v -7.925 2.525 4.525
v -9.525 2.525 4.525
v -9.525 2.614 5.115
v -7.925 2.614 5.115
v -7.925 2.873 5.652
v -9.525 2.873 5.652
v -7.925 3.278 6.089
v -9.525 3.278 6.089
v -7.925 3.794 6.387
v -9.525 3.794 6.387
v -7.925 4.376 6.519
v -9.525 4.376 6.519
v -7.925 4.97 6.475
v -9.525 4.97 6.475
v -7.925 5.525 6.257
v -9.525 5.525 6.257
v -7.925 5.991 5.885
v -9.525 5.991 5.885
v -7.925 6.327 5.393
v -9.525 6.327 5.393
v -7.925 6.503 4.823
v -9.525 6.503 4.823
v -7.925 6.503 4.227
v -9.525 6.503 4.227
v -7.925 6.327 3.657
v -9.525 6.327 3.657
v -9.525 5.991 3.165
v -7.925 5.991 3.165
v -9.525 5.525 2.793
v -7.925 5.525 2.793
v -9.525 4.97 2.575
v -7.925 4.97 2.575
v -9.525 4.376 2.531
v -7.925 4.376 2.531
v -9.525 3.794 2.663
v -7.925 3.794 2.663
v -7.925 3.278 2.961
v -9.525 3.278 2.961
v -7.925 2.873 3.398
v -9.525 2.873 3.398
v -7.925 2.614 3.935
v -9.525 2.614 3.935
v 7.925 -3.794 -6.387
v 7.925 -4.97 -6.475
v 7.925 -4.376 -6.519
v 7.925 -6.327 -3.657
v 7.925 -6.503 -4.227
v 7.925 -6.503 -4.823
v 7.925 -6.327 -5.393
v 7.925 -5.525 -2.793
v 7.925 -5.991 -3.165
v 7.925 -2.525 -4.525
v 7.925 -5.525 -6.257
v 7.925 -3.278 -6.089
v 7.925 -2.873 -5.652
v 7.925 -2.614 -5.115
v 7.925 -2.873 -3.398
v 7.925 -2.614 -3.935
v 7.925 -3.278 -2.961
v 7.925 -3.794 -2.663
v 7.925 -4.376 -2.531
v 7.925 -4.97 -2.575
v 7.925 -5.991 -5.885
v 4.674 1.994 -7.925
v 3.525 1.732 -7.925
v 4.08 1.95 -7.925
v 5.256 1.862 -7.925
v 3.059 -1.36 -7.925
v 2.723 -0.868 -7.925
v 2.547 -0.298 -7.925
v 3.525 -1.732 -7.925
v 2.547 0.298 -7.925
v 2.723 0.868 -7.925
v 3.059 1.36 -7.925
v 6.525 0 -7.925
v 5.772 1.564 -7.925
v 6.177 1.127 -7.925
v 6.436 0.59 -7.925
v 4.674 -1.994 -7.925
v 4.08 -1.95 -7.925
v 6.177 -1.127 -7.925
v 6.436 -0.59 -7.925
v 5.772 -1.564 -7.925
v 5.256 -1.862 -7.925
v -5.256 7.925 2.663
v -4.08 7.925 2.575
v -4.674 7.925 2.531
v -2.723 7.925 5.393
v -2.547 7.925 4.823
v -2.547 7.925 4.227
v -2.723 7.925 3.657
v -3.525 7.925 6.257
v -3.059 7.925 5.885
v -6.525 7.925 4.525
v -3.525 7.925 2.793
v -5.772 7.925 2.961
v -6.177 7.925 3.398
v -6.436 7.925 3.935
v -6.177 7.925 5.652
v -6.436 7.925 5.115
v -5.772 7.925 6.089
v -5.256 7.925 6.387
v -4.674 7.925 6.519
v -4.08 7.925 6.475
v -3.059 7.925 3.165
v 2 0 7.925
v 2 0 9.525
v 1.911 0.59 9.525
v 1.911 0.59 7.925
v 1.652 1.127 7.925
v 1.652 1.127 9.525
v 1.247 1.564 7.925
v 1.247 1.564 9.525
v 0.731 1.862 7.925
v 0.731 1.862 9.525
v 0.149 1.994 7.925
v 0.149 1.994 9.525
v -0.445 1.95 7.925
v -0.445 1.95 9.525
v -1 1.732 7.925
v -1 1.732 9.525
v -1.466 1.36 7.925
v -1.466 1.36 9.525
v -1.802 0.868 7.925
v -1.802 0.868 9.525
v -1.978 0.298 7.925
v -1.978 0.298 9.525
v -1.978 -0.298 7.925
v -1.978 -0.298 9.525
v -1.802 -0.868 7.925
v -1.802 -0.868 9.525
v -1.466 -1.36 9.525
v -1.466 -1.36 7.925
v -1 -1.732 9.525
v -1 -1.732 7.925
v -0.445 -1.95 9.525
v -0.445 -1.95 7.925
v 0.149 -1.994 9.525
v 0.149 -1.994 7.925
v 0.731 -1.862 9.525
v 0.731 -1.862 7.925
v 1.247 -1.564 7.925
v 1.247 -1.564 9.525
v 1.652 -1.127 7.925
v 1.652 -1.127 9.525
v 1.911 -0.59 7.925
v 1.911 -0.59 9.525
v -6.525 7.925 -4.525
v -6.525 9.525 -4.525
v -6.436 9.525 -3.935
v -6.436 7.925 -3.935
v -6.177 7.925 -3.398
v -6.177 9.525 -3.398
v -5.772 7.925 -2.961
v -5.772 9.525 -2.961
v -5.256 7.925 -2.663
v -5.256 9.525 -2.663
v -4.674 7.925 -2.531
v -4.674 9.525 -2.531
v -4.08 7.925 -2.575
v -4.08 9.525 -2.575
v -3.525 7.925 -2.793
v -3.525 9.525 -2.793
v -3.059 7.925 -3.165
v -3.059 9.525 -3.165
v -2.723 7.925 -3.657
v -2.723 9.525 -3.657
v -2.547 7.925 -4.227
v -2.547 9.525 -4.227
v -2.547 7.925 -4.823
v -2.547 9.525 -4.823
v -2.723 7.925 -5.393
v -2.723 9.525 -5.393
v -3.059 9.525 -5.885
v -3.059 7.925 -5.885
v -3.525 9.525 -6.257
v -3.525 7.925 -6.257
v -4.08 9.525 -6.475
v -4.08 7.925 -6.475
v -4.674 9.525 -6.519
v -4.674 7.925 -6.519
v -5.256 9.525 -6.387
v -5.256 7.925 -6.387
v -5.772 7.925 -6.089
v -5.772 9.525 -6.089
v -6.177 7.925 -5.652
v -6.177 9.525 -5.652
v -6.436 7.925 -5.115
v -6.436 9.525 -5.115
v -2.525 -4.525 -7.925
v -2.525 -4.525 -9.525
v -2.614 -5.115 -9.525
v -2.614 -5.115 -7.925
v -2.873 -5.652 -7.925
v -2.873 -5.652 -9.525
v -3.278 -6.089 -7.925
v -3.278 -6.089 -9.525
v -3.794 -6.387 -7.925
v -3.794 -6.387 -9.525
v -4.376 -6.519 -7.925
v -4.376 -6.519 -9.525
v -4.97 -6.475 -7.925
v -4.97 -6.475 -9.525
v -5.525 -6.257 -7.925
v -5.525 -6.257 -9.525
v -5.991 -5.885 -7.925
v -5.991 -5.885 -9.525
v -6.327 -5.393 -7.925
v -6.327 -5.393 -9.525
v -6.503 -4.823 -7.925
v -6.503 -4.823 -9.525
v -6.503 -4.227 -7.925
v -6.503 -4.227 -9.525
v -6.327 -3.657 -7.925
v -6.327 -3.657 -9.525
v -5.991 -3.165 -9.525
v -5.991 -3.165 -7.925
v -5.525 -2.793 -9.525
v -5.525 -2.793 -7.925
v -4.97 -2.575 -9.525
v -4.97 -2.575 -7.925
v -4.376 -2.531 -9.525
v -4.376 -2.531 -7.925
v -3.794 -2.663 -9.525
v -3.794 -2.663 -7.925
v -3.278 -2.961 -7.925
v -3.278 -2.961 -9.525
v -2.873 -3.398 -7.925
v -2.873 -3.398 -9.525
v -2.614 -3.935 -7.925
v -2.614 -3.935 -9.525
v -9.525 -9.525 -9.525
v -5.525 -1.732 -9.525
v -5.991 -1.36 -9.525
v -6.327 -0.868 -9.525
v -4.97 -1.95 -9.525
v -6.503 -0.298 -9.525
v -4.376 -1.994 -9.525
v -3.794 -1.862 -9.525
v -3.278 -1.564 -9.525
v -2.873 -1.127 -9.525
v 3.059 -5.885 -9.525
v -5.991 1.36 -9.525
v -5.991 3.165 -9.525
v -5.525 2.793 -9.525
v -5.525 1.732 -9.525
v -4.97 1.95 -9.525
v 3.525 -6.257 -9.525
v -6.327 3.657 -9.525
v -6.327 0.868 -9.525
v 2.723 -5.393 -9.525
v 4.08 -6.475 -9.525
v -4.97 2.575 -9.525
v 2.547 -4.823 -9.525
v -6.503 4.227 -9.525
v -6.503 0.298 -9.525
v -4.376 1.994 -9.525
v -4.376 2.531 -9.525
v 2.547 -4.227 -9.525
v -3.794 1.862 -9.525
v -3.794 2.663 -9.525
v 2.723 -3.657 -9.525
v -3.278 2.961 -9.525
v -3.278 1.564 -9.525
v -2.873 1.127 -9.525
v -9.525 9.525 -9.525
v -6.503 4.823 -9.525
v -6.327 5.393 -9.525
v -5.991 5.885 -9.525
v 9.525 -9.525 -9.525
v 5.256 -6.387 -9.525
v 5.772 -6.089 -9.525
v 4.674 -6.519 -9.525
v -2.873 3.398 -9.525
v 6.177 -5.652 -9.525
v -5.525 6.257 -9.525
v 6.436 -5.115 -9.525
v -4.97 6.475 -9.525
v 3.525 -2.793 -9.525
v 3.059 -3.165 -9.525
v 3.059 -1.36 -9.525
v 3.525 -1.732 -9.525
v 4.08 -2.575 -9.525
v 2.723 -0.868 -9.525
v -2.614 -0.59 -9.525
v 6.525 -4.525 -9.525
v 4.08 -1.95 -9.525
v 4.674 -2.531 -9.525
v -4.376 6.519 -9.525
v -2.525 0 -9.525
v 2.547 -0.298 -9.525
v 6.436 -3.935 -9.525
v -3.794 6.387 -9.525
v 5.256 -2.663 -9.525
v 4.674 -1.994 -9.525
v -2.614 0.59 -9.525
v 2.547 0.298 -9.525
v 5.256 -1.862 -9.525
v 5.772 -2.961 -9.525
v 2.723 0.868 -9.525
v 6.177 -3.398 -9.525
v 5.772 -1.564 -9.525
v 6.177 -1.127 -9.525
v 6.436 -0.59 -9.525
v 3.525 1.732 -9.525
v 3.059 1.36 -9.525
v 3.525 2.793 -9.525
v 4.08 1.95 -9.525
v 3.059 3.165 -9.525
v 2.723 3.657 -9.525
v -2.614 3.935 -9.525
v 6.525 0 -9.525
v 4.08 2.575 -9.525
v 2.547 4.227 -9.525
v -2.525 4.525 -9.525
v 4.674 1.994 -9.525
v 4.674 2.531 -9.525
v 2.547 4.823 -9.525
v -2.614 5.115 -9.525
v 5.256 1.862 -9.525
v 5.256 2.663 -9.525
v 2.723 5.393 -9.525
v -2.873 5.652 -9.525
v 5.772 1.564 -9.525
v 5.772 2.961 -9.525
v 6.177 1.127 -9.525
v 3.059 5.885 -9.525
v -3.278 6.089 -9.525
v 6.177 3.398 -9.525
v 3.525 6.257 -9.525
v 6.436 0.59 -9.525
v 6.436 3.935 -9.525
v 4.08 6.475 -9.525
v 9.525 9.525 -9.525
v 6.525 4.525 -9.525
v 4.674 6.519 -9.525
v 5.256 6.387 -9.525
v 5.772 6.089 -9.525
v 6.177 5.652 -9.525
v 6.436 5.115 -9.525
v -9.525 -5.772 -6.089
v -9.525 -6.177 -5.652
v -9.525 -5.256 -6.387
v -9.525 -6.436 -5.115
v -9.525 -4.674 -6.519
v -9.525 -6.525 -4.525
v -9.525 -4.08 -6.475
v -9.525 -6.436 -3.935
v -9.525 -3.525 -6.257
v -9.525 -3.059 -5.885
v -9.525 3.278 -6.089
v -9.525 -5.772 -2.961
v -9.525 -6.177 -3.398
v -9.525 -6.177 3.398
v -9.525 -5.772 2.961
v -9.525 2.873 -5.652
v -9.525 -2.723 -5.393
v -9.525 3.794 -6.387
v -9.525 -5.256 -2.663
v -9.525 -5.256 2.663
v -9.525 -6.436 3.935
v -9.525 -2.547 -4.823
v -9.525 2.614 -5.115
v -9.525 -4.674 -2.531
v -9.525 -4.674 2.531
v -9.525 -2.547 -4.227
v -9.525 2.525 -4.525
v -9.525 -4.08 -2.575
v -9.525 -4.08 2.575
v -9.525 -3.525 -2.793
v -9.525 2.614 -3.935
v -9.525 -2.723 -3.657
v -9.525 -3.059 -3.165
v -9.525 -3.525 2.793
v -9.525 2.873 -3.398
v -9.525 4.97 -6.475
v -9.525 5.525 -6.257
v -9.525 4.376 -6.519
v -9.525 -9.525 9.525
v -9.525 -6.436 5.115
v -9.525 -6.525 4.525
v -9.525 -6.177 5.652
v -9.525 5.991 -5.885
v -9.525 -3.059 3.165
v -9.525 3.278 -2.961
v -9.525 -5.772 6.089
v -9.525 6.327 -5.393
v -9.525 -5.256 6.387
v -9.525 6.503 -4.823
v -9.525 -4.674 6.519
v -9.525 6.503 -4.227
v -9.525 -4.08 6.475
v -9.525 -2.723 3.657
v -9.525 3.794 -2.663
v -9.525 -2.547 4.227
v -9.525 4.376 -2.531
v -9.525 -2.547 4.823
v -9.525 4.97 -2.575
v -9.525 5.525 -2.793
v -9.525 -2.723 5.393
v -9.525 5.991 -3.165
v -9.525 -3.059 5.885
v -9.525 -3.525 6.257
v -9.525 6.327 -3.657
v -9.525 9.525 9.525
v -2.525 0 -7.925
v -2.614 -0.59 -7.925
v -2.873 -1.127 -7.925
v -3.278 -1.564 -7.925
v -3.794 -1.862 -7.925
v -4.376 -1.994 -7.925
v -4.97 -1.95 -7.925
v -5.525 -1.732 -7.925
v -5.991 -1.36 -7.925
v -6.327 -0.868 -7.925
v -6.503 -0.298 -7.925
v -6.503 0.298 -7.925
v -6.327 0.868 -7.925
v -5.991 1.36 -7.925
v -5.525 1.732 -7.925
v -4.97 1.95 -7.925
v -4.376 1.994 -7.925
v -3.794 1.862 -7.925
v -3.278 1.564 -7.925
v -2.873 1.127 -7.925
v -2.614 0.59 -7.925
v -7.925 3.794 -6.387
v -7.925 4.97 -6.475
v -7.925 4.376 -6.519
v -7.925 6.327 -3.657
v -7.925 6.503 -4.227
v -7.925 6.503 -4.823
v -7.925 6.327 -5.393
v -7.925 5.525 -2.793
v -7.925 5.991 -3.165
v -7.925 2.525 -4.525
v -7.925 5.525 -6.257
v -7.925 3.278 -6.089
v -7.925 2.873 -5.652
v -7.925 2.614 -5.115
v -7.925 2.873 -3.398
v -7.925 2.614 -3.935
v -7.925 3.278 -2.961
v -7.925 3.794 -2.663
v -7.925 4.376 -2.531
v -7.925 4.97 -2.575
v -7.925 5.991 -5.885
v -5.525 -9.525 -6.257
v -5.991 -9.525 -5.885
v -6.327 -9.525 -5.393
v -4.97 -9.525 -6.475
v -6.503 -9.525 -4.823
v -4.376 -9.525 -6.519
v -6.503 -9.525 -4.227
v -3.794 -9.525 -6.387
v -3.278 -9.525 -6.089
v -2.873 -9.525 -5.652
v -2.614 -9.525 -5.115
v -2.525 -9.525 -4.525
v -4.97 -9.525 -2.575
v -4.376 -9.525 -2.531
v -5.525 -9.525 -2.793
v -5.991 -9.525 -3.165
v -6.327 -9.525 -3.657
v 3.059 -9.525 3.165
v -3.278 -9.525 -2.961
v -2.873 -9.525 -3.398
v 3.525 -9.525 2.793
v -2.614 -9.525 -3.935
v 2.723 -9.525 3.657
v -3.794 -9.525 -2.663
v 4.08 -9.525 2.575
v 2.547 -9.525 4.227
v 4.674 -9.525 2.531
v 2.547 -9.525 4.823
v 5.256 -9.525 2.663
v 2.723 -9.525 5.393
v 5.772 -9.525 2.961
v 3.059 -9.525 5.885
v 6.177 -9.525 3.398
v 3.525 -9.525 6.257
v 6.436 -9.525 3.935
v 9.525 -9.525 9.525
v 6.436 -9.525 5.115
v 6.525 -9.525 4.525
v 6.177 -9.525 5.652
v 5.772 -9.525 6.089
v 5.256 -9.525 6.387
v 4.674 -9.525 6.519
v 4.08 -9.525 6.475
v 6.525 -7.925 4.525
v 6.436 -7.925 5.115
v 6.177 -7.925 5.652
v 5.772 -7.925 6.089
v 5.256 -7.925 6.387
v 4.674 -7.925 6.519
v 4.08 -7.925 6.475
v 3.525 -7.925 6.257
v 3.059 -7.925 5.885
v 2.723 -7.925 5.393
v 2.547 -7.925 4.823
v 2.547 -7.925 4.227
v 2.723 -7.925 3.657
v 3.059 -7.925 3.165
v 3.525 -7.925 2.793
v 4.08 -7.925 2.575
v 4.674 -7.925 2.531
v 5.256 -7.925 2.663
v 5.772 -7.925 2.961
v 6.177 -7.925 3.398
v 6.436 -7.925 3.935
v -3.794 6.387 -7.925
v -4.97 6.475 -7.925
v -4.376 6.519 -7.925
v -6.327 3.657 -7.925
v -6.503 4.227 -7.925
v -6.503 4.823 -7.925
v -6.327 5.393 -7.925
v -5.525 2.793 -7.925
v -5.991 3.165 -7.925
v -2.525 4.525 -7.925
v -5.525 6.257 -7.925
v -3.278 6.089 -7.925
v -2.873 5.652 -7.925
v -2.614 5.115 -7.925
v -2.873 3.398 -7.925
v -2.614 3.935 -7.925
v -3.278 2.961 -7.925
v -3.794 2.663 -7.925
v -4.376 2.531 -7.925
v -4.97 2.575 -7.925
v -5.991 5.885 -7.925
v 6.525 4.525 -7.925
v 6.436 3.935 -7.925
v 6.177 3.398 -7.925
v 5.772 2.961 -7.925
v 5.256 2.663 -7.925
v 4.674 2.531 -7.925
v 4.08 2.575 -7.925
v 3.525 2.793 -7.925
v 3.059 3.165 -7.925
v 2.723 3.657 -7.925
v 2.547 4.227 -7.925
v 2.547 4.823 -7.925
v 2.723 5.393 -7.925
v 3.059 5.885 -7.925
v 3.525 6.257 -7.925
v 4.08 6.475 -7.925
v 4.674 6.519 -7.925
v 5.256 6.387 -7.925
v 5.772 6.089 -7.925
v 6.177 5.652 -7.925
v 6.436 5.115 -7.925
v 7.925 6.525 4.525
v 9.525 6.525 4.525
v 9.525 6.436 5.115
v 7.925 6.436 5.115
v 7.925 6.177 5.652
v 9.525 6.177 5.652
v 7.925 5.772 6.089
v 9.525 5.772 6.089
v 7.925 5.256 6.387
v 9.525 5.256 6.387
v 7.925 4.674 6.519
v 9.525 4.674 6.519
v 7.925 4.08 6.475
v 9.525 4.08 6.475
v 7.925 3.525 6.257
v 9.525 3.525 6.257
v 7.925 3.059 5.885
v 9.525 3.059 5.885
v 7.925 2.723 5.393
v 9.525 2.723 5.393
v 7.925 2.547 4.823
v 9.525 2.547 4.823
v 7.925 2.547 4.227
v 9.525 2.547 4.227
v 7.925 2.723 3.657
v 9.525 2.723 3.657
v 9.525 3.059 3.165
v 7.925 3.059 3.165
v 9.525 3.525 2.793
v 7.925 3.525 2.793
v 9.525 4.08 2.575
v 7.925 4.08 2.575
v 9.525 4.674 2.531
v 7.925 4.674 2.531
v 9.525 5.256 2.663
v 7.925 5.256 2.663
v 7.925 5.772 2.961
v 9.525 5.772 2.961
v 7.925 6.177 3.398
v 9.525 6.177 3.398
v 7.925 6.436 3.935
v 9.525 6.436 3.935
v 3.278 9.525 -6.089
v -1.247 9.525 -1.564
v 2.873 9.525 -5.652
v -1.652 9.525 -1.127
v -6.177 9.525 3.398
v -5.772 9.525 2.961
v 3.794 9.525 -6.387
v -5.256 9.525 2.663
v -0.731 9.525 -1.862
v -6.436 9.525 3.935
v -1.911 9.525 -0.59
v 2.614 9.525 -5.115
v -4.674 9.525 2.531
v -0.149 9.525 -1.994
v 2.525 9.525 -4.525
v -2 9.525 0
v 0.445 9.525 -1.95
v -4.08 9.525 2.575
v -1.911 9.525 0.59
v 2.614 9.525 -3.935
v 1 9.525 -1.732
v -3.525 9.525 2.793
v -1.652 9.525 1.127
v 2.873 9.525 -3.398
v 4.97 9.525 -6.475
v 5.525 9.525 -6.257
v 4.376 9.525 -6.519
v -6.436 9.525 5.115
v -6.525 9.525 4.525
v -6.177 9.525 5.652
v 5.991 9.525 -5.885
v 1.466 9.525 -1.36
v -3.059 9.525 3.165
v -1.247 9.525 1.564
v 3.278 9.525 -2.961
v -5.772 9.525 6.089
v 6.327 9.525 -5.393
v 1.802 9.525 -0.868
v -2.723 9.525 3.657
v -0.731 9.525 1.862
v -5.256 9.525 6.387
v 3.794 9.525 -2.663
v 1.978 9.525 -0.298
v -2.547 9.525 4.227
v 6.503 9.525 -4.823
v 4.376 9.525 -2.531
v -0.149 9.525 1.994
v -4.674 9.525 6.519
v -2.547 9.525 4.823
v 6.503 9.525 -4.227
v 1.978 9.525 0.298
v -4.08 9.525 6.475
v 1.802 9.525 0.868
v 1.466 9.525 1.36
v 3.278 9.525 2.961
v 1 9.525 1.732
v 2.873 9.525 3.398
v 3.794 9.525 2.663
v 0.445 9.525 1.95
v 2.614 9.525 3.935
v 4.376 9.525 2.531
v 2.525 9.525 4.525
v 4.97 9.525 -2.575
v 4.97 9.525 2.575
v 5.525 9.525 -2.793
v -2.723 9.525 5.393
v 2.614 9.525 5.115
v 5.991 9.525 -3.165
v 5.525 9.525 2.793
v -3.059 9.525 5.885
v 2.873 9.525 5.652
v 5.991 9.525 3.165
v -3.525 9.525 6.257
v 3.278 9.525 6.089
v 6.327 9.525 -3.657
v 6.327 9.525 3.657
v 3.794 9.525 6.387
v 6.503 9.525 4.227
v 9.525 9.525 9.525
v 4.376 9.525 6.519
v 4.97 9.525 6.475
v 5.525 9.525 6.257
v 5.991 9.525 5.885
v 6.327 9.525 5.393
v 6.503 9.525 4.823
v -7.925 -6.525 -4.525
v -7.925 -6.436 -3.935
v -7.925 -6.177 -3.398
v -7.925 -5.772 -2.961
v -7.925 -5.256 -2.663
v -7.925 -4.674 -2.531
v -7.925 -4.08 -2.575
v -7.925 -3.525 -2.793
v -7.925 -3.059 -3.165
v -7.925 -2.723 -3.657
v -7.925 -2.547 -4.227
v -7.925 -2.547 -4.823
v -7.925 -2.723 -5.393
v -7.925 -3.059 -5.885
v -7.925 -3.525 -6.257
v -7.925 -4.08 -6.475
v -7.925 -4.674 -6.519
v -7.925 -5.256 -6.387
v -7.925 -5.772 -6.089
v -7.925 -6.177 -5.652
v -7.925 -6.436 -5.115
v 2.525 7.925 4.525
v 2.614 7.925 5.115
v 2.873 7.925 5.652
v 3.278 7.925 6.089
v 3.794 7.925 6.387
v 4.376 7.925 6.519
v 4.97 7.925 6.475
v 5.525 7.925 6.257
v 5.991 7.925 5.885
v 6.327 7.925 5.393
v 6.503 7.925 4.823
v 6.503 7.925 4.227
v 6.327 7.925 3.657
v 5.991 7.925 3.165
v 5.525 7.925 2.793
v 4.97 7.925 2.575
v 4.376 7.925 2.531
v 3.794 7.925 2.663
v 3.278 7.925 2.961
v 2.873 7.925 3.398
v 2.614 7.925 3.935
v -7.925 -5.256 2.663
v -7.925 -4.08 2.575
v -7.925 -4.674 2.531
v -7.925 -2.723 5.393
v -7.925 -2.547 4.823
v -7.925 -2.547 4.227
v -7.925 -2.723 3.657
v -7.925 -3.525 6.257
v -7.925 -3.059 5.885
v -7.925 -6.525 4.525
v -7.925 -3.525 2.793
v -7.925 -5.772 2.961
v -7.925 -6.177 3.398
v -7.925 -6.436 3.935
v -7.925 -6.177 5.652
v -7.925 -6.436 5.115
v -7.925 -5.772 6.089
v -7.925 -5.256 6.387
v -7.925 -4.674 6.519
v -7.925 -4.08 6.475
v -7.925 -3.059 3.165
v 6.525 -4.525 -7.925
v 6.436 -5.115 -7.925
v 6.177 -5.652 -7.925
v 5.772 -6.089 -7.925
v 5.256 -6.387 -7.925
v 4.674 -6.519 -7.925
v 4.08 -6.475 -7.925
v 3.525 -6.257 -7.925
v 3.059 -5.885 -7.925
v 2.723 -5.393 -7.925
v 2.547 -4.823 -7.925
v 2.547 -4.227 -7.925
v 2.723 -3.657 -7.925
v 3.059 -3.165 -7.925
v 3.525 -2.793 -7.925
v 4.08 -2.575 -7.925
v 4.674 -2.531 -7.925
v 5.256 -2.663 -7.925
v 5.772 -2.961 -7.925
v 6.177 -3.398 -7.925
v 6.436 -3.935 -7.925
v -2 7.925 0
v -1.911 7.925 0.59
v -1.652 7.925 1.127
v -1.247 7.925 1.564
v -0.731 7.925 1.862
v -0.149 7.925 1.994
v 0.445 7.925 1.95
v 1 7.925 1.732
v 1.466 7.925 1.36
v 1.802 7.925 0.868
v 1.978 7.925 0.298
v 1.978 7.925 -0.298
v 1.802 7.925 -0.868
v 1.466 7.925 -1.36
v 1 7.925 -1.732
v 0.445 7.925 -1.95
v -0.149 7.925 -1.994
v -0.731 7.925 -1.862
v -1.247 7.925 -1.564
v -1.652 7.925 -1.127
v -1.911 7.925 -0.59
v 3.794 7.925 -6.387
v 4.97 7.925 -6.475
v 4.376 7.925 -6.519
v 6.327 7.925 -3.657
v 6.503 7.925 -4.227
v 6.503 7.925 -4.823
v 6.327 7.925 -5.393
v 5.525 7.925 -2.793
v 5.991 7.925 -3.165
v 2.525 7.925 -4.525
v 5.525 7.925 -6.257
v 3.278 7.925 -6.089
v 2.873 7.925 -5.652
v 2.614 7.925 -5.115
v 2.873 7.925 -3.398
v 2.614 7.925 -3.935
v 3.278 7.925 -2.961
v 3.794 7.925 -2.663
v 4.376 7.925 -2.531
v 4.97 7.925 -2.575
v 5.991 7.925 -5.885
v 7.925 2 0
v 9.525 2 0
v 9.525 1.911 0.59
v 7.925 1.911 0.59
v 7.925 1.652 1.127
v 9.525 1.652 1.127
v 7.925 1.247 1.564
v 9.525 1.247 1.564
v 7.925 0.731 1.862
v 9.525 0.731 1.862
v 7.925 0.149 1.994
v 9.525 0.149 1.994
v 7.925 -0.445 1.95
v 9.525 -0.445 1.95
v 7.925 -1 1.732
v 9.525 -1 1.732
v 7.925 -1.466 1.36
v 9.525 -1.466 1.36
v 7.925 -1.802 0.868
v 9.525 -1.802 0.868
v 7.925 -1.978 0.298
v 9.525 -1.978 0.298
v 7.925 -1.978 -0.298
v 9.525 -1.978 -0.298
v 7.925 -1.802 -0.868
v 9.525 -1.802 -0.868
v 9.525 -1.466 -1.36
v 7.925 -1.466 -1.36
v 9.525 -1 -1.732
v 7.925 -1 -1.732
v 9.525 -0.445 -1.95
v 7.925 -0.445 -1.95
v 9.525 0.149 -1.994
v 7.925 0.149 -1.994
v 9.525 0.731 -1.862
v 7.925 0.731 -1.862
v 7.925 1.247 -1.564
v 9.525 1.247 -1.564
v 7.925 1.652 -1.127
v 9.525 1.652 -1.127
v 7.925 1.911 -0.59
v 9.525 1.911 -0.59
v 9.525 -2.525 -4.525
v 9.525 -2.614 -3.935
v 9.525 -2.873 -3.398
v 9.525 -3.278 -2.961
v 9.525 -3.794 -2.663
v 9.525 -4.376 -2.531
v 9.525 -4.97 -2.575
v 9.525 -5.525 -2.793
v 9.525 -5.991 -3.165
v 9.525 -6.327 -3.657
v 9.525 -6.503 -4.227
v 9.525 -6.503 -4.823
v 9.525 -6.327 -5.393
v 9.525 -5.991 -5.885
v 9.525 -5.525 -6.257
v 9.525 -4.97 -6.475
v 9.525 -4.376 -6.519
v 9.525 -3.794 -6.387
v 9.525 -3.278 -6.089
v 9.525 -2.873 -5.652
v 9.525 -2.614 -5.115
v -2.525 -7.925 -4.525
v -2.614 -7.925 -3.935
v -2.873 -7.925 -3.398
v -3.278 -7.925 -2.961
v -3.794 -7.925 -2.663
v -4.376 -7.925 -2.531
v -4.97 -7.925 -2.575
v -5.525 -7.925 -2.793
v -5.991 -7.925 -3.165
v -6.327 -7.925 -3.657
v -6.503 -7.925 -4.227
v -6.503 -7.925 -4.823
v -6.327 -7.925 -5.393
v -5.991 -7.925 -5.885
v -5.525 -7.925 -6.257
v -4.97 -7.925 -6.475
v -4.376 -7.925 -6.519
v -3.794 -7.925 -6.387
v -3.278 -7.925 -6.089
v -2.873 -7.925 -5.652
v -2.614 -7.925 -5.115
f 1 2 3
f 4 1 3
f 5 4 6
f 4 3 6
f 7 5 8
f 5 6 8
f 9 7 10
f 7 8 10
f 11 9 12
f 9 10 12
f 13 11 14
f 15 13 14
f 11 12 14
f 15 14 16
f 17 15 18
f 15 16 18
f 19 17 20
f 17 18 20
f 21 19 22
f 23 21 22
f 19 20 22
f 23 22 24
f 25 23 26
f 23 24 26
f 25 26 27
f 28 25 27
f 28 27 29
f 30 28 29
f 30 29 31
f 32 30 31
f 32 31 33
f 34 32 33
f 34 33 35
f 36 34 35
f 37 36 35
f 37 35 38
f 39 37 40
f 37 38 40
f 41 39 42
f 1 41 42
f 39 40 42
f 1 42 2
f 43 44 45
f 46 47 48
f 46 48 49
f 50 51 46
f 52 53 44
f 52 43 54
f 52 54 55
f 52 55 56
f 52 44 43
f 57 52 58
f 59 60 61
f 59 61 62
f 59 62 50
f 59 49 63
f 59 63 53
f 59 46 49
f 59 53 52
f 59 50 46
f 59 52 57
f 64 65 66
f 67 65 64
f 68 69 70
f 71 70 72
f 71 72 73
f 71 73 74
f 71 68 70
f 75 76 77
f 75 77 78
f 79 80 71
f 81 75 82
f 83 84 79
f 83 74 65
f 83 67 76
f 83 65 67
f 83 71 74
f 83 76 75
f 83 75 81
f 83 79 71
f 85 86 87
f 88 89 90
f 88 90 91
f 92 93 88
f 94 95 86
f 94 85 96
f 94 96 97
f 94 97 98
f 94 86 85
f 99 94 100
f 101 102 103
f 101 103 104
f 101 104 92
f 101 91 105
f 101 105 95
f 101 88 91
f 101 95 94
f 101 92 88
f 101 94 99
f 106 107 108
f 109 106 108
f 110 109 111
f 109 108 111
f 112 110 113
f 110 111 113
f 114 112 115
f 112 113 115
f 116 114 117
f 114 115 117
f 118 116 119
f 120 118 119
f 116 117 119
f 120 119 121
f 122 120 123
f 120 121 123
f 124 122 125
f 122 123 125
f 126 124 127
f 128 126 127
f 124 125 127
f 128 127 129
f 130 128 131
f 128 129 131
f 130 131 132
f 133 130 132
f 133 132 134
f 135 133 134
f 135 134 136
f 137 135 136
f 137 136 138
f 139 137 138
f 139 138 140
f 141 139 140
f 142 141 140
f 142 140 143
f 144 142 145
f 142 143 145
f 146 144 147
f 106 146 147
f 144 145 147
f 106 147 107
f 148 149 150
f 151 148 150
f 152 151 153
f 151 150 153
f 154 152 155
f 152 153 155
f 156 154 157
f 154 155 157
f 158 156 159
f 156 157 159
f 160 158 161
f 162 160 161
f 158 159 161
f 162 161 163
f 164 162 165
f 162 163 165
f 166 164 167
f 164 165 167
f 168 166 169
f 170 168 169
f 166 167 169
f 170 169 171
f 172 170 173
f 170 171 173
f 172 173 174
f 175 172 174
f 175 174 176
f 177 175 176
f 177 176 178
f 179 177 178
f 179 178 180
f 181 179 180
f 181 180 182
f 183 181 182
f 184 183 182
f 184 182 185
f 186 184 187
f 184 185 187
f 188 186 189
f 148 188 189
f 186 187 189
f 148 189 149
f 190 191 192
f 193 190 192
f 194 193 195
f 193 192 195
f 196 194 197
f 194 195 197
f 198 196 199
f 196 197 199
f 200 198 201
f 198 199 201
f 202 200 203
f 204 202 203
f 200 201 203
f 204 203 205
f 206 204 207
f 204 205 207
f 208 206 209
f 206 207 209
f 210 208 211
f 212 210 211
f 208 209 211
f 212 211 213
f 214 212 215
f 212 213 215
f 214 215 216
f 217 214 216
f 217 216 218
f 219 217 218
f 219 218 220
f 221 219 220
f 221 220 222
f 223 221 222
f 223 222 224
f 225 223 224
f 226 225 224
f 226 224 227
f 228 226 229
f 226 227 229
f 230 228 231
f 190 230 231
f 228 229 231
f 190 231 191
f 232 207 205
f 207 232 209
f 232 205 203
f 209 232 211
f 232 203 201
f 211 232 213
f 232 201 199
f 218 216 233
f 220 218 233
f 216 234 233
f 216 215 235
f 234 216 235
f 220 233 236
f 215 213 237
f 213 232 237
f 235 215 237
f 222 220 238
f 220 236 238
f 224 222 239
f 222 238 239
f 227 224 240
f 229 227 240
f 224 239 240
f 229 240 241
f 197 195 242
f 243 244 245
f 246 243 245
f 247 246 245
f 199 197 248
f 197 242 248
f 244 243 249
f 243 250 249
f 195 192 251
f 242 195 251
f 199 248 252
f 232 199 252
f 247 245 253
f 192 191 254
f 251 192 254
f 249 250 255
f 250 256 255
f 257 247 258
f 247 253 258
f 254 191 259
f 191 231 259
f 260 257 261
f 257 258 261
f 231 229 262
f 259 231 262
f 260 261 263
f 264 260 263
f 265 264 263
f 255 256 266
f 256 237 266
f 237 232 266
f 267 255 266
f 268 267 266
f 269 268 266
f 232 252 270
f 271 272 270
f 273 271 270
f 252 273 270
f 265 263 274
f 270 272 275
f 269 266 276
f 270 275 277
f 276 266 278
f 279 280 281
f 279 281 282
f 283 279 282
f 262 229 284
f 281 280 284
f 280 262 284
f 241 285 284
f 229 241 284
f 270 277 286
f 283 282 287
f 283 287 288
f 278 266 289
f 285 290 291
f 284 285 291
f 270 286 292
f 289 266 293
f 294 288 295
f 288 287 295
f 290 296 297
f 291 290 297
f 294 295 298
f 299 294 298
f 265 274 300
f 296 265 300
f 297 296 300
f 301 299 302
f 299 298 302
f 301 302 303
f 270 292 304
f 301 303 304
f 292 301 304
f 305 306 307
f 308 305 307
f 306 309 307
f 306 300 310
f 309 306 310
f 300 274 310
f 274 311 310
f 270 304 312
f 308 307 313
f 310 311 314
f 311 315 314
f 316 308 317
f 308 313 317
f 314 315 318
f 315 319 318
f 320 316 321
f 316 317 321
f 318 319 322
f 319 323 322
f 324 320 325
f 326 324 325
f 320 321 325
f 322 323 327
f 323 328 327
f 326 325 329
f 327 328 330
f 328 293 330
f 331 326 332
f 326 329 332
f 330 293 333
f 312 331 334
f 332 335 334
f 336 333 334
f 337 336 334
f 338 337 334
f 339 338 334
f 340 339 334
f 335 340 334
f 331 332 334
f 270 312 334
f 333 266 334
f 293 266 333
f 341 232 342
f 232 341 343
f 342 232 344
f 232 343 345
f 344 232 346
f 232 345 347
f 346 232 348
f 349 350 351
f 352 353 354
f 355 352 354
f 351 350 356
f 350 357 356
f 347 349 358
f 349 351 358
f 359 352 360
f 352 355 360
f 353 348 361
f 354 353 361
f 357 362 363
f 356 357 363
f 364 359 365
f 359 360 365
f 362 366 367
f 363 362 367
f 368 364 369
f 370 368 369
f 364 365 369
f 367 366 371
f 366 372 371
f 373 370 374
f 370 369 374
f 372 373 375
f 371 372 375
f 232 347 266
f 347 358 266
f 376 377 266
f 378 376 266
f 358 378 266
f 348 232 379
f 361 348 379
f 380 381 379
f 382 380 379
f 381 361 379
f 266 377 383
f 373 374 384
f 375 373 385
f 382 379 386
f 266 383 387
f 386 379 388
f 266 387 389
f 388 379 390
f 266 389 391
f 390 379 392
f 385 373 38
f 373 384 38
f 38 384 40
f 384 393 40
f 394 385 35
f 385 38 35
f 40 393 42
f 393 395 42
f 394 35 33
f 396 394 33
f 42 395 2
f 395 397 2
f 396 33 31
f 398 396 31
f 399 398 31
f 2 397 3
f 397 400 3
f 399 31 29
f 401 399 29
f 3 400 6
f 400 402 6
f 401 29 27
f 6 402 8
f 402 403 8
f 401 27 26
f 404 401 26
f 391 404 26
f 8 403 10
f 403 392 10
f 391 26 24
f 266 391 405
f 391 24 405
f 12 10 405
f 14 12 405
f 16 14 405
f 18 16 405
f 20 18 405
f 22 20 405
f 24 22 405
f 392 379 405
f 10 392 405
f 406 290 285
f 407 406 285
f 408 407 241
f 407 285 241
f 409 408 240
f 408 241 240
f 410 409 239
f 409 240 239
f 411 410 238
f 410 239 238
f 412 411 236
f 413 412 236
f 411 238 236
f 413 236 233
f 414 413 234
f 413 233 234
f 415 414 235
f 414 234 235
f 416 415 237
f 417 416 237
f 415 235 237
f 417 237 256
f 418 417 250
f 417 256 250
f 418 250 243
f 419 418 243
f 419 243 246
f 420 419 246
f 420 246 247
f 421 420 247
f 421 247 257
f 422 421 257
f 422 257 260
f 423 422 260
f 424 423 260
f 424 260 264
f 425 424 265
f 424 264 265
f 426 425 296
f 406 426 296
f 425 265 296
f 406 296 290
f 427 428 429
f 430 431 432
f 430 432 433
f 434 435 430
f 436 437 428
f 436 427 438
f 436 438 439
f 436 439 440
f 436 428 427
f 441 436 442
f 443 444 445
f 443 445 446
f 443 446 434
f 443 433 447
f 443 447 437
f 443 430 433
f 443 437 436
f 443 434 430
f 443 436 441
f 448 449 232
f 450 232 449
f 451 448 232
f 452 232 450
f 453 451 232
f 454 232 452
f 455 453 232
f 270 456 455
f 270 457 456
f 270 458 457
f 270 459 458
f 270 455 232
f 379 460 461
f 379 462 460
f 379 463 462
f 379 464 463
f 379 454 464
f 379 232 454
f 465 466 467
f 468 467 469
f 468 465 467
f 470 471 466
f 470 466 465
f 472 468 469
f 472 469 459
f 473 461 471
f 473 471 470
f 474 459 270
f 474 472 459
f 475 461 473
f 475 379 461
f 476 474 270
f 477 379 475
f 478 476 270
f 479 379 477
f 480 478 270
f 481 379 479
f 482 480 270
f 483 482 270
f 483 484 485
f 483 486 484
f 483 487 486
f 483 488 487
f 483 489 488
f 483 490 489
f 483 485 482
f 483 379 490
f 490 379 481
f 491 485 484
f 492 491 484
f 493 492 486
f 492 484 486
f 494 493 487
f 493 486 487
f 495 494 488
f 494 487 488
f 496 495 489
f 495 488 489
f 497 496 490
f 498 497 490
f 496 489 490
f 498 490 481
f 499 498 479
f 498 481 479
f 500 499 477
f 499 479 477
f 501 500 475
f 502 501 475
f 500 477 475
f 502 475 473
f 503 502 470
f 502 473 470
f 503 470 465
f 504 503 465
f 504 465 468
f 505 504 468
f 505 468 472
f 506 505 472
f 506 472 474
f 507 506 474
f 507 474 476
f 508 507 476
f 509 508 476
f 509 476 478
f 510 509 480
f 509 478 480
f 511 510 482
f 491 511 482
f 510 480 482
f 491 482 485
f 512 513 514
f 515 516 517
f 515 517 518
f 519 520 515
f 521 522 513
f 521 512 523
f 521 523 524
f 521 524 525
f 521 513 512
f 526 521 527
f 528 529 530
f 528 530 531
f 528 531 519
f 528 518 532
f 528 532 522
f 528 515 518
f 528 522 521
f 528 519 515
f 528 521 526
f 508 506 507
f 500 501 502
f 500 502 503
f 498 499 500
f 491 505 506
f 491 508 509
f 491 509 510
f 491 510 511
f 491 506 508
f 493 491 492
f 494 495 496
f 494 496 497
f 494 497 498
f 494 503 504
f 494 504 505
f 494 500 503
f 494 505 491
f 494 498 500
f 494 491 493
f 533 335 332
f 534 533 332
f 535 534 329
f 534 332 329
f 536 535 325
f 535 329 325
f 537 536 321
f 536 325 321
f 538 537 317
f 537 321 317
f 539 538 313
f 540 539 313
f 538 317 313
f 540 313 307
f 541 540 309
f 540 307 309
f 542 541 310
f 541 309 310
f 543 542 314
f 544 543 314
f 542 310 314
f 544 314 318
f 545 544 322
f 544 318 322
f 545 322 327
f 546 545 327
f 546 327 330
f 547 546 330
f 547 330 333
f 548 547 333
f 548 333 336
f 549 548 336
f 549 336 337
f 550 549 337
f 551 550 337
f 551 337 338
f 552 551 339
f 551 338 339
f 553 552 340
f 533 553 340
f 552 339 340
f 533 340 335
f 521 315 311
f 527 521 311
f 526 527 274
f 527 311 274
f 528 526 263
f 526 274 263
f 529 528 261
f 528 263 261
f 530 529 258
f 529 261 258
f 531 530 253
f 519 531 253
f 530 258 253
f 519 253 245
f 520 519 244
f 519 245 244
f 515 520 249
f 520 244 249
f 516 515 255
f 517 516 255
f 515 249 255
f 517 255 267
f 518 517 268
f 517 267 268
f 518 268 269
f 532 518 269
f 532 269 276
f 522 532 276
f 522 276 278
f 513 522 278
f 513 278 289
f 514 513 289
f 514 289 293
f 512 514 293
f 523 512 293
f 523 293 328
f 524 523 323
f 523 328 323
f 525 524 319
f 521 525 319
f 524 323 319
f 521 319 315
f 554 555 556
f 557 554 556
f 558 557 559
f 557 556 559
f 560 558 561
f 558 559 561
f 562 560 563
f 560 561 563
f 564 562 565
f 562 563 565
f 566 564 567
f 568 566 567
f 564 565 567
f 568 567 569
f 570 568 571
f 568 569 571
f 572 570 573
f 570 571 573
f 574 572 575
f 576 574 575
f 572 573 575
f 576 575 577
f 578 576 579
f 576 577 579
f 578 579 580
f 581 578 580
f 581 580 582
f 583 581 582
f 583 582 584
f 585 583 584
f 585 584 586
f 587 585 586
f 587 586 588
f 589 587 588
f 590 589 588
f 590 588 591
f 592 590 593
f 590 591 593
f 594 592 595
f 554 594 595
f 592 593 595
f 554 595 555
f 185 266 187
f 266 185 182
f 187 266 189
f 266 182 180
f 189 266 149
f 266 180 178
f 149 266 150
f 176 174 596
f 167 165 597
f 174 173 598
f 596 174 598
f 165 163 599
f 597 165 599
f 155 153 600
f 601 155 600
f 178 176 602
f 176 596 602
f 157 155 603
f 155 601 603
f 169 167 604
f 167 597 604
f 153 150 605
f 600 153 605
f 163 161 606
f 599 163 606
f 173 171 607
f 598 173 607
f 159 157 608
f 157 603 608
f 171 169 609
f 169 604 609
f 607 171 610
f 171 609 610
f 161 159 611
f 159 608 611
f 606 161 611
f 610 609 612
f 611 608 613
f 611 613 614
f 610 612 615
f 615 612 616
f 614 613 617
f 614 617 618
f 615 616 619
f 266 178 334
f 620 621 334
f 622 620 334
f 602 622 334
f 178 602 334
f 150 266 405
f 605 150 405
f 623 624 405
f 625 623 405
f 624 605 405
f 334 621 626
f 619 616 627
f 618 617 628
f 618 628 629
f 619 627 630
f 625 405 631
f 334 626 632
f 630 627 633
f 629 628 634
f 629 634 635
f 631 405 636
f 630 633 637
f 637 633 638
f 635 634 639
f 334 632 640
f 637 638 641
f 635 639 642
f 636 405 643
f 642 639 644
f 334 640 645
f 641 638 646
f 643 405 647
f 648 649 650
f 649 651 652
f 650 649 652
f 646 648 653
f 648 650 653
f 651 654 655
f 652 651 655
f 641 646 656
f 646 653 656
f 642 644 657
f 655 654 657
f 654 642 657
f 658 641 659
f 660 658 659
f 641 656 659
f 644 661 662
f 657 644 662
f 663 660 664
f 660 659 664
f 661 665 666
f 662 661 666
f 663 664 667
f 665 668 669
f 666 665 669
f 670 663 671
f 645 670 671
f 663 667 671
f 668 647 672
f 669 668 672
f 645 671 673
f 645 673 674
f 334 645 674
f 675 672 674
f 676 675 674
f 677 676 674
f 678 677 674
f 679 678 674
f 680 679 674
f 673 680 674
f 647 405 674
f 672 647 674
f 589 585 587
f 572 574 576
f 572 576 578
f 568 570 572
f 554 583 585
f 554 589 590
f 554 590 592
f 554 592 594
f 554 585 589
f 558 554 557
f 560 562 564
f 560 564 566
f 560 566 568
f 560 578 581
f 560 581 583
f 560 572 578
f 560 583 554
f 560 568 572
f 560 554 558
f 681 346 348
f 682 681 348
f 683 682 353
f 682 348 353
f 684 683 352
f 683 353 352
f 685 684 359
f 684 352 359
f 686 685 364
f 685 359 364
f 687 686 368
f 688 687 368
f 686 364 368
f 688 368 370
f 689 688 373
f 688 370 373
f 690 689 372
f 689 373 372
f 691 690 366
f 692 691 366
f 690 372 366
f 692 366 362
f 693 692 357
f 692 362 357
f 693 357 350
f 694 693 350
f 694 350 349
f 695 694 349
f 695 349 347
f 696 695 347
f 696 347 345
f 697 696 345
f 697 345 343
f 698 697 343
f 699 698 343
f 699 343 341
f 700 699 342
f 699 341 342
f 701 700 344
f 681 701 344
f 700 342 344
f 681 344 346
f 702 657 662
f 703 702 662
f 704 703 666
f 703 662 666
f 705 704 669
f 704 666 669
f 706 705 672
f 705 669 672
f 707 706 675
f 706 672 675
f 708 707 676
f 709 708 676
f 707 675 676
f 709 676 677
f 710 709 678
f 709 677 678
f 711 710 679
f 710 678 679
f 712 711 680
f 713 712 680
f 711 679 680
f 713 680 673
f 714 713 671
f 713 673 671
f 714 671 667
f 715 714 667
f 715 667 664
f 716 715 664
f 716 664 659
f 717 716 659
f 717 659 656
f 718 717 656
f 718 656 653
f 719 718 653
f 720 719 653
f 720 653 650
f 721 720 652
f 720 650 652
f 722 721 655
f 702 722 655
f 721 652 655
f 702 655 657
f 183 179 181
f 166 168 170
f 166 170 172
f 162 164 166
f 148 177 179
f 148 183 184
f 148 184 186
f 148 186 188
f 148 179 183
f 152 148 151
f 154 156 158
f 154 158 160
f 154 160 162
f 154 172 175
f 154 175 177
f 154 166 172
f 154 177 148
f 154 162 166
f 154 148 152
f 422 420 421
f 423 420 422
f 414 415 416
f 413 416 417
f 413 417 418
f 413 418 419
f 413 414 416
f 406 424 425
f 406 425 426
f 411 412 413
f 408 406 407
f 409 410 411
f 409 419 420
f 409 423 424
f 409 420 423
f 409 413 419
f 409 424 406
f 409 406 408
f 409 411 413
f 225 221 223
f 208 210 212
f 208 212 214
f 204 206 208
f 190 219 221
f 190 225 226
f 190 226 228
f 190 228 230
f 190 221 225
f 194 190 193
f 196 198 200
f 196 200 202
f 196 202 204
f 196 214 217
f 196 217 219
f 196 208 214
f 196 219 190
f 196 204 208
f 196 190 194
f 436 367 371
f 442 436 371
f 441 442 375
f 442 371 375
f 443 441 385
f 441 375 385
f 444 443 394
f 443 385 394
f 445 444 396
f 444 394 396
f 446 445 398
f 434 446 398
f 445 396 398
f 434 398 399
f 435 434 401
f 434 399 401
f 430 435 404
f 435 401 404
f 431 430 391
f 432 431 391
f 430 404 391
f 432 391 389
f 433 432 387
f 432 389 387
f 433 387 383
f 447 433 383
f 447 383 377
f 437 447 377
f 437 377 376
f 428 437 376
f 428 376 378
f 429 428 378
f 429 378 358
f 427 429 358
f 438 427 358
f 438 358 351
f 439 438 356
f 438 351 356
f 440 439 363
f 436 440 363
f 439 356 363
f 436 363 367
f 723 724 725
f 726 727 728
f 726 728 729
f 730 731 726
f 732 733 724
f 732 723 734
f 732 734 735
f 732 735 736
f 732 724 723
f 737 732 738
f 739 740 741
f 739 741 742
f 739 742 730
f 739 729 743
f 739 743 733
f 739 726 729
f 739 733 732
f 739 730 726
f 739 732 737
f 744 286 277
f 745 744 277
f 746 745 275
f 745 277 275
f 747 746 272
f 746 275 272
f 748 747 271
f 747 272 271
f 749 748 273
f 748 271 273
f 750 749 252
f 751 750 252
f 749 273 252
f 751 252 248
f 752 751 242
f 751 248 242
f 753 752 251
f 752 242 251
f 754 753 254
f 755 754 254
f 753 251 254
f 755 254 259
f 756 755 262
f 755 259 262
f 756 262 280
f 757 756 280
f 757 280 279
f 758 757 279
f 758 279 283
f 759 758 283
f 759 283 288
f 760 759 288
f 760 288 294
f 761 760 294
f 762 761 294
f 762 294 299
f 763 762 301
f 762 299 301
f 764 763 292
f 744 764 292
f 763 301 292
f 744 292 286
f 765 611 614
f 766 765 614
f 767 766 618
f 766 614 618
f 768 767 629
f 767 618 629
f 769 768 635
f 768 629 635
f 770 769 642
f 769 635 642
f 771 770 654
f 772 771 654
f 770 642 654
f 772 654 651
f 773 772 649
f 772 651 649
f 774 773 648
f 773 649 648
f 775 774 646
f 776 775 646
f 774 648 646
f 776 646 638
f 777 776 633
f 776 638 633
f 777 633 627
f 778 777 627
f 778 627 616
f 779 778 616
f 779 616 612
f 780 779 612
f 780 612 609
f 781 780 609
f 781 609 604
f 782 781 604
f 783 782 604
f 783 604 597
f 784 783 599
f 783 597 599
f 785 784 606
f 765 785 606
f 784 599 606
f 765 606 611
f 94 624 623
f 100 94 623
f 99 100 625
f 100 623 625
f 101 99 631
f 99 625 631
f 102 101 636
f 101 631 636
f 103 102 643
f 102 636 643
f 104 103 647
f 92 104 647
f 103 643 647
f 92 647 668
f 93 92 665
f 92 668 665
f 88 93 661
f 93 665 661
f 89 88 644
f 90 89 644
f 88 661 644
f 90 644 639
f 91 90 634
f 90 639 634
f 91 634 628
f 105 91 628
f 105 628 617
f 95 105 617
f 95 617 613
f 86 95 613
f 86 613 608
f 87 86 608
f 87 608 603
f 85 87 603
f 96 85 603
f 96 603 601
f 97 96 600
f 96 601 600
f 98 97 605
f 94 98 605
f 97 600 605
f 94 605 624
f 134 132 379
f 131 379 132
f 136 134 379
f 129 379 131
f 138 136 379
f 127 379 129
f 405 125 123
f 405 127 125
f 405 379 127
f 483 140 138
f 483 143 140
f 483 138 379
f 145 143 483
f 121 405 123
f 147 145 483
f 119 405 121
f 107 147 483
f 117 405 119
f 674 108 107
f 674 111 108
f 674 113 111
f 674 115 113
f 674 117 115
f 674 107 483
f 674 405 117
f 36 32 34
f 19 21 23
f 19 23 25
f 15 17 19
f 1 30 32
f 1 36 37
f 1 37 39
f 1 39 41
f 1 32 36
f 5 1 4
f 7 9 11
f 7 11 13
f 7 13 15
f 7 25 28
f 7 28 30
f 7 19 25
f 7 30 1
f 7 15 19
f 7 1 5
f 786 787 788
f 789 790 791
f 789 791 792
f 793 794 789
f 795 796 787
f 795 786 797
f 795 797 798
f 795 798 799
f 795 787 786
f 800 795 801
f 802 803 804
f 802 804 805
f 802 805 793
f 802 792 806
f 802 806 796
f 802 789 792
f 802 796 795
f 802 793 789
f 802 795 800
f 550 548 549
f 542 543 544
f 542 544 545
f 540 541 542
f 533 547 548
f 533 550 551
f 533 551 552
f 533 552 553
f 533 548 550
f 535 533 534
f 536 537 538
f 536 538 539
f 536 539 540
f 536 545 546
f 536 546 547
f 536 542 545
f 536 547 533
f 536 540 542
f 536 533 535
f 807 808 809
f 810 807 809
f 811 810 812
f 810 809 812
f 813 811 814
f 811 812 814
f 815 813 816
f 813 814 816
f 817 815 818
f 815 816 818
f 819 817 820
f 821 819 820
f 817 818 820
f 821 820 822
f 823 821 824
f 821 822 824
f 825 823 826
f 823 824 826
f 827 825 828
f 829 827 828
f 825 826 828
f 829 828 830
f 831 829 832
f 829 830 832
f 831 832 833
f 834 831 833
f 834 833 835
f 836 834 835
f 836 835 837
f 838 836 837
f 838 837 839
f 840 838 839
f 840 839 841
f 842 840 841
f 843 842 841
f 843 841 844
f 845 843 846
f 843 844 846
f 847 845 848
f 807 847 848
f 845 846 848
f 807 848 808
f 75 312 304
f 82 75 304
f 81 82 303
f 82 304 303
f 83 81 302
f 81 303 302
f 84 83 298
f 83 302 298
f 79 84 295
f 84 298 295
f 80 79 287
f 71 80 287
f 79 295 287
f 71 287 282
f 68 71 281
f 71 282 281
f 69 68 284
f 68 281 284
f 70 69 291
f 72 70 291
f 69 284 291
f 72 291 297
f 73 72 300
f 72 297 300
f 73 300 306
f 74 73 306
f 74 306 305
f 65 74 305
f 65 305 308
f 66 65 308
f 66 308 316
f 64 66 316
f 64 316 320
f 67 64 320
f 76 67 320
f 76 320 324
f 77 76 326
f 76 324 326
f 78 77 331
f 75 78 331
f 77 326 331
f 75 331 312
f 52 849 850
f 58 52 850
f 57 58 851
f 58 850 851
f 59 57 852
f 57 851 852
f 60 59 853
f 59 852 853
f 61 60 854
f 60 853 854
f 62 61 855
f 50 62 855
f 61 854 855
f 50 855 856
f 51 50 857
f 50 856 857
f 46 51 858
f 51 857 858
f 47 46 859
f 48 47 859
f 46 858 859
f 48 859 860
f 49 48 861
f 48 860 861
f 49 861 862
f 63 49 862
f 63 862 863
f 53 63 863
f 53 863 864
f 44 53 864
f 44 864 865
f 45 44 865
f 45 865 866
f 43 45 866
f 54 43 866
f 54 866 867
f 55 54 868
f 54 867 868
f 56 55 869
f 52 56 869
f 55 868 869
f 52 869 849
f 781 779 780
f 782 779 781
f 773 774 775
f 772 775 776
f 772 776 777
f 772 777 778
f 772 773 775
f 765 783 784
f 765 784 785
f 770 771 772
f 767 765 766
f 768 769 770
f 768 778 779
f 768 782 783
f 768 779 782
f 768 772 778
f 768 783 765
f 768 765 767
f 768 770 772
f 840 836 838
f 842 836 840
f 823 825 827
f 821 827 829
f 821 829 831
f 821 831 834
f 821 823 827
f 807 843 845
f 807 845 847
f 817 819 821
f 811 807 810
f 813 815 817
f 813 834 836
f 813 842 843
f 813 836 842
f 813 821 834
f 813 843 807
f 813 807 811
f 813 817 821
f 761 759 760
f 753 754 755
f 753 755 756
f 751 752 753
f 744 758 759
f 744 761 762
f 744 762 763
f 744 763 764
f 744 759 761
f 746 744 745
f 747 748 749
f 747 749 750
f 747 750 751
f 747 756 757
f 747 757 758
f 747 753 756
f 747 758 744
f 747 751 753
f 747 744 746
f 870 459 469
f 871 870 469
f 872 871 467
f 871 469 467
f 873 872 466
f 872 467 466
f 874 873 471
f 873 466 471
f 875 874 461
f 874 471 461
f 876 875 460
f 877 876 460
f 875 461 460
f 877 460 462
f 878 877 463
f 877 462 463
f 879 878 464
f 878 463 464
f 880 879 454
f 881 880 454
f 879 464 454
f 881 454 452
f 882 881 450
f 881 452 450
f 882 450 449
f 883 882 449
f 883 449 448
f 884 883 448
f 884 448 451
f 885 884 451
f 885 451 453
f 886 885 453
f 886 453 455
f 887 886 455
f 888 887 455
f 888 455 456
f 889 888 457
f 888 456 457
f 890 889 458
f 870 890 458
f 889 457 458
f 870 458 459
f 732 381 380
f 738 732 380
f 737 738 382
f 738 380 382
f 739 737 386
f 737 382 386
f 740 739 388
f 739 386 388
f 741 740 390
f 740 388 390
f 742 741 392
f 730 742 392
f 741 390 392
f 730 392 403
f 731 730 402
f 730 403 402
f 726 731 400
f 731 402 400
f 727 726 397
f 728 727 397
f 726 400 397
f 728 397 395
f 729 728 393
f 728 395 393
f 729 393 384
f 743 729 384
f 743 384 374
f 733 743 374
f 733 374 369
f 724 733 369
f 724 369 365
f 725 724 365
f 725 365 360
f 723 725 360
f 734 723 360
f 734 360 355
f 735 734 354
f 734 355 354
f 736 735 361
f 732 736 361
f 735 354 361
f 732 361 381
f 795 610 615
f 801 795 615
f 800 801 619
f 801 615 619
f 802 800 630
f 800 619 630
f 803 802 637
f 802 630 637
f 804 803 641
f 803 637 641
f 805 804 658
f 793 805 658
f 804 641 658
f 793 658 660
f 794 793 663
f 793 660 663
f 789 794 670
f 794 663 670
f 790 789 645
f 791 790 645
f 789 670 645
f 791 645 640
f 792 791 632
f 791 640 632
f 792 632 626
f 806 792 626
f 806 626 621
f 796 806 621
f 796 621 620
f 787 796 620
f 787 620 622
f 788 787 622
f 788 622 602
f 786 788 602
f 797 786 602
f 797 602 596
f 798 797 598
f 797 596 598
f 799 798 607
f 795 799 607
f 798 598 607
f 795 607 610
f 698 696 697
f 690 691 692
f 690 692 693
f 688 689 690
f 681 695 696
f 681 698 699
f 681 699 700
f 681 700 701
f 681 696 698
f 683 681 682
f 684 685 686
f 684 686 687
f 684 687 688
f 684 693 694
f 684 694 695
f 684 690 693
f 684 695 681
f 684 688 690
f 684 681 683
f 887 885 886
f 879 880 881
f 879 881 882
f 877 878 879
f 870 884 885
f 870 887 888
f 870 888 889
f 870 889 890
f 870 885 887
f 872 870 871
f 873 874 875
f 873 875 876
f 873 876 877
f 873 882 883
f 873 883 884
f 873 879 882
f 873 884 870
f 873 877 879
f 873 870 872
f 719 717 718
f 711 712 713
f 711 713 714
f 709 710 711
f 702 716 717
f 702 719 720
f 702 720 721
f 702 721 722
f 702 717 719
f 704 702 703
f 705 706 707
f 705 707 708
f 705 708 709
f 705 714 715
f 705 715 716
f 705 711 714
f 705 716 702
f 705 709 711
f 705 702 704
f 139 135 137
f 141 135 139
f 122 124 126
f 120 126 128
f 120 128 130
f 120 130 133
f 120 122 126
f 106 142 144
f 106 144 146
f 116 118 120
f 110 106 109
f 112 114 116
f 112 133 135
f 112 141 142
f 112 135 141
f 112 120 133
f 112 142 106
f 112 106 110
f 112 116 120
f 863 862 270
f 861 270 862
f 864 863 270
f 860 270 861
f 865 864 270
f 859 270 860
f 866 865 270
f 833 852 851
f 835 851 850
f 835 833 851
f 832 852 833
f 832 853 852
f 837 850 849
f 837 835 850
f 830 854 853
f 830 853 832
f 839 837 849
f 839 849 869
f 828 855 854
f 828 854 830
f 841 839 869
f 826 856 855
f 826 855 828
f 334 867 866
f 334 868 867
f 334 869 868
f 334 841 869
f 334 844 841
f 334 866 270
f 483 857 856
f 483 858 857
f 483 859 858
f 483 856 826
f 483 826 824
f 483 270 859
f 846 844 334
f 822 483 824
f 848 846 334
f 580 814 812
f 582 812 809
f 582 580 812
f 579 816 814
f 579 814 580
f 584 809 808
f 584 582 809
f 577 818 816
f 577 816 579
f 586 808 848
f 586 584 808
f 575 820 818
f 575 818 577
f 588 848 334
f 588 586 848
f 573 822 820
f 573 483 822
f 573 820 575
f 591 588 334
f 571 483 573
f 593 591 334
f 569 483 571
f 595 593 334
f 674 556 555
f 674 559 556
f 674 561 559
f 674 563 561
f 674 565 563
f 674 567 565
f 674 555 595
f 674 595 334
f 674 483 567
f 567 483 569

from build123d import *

# Parameters (mm, degrees)
F0_W      = 19.05
F0_H      = 19.05
F1_DEPTH  = 9.525
F2_R      = 2
F3_DEPTH  = 1.6
F4_R      = 2
F5_DEPTH  = 1.6
F6_R      = 2
F7_DEPTH  = 1.6
F8_R      = 2
F9_DEPTH  = 1.6
F10_R     = 2
F11_DEPTH = 1.6
F12_R     = 2
F13_DEPTH = 1.6


with BuildPart() as f1:
    # F0 (on Top) → F1 (new body, symmetric)
    with BuildSketch(Plane.XY):
        Rectangle(F0_W, F0_H)
    extrude(amount=F1_DEPTH, both=True)

    # F2 (on face) → F3 (cut)
    with BuildSketch(Plane.XY.offset(9.525)):
        Circle(F2_R)
    extrude(amount=-F3_DEPTH, mode=Mode.SUBTRACT)

    # F4 (on face) → F5 (cut)
    with BuildSketch(Plane.XZ.offset(9.525)):
        with Locations((-4.525, -4.525)):
            Circle(F4_R)
        with Locations((4.525, 4.525)):
            Circle(F4_R)
    extrude(amount=-F5_DEPTH, mode=Mode.SUBTRACT)

    # F6 (on face) → F7 (cut)
    with BuildSketch(Plane(origin=(0, 0, -9.525), x_dir=(1, 0, 0), z_dir=(0, 0, -1))):
        with Locations((-4.525, -4.525)):
            Circle(F6_R)
        with Locations((-4.525, 4.525)):
            Circle(F6_R)
        with Locations((4.525, -4.525)):
            Circle(F6_R)
        with Locations((4.525, 4.525)):
            Circle(F6_R)
        with Locations((-4.525, 0)):
            Circle(F6_R)
        with Locations((4.525, 0)):
            Circle(F6_R)
    extrude(amount=-F7_DEPTH, mode=Mode.SUBTRACT)

    # F8 (on face) → F9 (cut)
    with BuildSketch(Plane(origin=(0, 9.525, 0), x_dir=(-1, 0, 0), z_dir=(0, 1, 0))):
        with Locations((-4.525, -4.525)):
            Circle(F8_R)
        Circle(F8_R)
        with Locations((-4.525, 4.525)):
            Circle(F8_R)
        with Locations((4.525, -4.525)):
            Circle(F8_R)
        with Locations((4.525, 4.525)):
            Circle(F8_R)
    extrude(amount=-F9_DEPTH, mode=Mode.SUBTRACT)

    # F10 (on face) → F11 (cut)
    with BuildSketch(Plane.YZ.offset(9.525)):
        with Locations((-4.525, -4.525)):
            Circle(F10_R)
        Circle(F10_R)
        with Locations((4.525, 4.525)):
            Circle(F10_R)
    extrude(amount=-F11_DEPTH, mode=Mode.SUBTRACT)

    # F12 (on face) → F13 (cut)
    with BuildSketch(Plane(origin=(-9.525, 0, 0), x_dir=(0, -1, 0), z_dir=(-1, 0, 0))):
        with Locations((-4.525, -4.525)):
            Circle(F12_R)
        with Locations((-4.525, 4.525)):
            Circle(F12_R)
        with Locations((4.525, -4.525)):
            Circle(F12_R)
        with Locations((4.525, 4.525)):
            Circle(F12_R)
    extrude(amount=-F13_DEPTH, mode=Mode.SUBTRACT)


solid = f1.part
